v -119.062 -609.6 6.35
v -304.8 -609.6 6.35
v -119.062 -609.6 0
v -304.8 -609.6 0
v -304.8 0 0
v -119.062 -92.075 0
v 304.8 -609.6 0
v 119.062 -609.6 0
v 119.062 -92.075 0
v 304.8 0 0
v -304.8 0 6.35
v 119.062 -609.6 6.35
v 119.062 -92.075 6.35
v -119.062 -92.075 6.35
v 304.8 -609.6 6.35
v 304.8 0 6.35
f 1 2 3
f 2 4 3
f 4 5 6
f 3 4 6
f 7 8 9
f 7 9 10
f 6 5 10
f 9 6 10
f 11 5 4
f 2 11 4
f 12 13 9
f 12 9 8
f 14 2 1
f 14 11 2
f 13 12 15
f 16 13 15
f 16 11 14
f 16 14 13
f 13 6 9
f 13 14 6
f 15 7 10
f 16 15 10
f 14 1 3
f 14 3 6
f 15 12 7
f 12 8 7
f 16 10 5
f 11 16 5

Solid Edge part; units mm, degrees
sketch "Sketch1" plane through (0, 0, 0) normal (0, 0, 1) x (1, 0, 0)
  line L0 (-304.8, -609.6) -> (304.8, -609.6)
  line L1 (304.8, -609.6) -> (304.8, 0)
  line L2 (304.8, 0) -> (-304.8, 0)
  line L3 (-304.8, 0) -> (-304.8, -609.6)
  dimension "D1" = 609.6
  dimension "D2" = 609.6
extrude "Protrusion1" add sketch "Sketch1" along normal blind 6.35
extrude "Cutout1" [suppressed]
sketch "Sketch2" plane through (0, -304.8, 6.35) normal (0, 0, 1) x (0, 1, 0)
  line L0 (212.725, -119.0625) -> (-304.8, -119.0625)
  line L1 (-304.8, -119.0625) -> (-304.8, 119.0625)
  line L2 (-304.8, 119.0625) -> (212.725, 119.0625)
  line L3 (212.725, 119.0625) -> (212.725, -119.0625)
  dimension "D1" = 238.125
  dimension "D2" = 517.525
extrude "Cutout2" cut sketch "Sketch2" against normal through all
properties material "Wood, Pine"
